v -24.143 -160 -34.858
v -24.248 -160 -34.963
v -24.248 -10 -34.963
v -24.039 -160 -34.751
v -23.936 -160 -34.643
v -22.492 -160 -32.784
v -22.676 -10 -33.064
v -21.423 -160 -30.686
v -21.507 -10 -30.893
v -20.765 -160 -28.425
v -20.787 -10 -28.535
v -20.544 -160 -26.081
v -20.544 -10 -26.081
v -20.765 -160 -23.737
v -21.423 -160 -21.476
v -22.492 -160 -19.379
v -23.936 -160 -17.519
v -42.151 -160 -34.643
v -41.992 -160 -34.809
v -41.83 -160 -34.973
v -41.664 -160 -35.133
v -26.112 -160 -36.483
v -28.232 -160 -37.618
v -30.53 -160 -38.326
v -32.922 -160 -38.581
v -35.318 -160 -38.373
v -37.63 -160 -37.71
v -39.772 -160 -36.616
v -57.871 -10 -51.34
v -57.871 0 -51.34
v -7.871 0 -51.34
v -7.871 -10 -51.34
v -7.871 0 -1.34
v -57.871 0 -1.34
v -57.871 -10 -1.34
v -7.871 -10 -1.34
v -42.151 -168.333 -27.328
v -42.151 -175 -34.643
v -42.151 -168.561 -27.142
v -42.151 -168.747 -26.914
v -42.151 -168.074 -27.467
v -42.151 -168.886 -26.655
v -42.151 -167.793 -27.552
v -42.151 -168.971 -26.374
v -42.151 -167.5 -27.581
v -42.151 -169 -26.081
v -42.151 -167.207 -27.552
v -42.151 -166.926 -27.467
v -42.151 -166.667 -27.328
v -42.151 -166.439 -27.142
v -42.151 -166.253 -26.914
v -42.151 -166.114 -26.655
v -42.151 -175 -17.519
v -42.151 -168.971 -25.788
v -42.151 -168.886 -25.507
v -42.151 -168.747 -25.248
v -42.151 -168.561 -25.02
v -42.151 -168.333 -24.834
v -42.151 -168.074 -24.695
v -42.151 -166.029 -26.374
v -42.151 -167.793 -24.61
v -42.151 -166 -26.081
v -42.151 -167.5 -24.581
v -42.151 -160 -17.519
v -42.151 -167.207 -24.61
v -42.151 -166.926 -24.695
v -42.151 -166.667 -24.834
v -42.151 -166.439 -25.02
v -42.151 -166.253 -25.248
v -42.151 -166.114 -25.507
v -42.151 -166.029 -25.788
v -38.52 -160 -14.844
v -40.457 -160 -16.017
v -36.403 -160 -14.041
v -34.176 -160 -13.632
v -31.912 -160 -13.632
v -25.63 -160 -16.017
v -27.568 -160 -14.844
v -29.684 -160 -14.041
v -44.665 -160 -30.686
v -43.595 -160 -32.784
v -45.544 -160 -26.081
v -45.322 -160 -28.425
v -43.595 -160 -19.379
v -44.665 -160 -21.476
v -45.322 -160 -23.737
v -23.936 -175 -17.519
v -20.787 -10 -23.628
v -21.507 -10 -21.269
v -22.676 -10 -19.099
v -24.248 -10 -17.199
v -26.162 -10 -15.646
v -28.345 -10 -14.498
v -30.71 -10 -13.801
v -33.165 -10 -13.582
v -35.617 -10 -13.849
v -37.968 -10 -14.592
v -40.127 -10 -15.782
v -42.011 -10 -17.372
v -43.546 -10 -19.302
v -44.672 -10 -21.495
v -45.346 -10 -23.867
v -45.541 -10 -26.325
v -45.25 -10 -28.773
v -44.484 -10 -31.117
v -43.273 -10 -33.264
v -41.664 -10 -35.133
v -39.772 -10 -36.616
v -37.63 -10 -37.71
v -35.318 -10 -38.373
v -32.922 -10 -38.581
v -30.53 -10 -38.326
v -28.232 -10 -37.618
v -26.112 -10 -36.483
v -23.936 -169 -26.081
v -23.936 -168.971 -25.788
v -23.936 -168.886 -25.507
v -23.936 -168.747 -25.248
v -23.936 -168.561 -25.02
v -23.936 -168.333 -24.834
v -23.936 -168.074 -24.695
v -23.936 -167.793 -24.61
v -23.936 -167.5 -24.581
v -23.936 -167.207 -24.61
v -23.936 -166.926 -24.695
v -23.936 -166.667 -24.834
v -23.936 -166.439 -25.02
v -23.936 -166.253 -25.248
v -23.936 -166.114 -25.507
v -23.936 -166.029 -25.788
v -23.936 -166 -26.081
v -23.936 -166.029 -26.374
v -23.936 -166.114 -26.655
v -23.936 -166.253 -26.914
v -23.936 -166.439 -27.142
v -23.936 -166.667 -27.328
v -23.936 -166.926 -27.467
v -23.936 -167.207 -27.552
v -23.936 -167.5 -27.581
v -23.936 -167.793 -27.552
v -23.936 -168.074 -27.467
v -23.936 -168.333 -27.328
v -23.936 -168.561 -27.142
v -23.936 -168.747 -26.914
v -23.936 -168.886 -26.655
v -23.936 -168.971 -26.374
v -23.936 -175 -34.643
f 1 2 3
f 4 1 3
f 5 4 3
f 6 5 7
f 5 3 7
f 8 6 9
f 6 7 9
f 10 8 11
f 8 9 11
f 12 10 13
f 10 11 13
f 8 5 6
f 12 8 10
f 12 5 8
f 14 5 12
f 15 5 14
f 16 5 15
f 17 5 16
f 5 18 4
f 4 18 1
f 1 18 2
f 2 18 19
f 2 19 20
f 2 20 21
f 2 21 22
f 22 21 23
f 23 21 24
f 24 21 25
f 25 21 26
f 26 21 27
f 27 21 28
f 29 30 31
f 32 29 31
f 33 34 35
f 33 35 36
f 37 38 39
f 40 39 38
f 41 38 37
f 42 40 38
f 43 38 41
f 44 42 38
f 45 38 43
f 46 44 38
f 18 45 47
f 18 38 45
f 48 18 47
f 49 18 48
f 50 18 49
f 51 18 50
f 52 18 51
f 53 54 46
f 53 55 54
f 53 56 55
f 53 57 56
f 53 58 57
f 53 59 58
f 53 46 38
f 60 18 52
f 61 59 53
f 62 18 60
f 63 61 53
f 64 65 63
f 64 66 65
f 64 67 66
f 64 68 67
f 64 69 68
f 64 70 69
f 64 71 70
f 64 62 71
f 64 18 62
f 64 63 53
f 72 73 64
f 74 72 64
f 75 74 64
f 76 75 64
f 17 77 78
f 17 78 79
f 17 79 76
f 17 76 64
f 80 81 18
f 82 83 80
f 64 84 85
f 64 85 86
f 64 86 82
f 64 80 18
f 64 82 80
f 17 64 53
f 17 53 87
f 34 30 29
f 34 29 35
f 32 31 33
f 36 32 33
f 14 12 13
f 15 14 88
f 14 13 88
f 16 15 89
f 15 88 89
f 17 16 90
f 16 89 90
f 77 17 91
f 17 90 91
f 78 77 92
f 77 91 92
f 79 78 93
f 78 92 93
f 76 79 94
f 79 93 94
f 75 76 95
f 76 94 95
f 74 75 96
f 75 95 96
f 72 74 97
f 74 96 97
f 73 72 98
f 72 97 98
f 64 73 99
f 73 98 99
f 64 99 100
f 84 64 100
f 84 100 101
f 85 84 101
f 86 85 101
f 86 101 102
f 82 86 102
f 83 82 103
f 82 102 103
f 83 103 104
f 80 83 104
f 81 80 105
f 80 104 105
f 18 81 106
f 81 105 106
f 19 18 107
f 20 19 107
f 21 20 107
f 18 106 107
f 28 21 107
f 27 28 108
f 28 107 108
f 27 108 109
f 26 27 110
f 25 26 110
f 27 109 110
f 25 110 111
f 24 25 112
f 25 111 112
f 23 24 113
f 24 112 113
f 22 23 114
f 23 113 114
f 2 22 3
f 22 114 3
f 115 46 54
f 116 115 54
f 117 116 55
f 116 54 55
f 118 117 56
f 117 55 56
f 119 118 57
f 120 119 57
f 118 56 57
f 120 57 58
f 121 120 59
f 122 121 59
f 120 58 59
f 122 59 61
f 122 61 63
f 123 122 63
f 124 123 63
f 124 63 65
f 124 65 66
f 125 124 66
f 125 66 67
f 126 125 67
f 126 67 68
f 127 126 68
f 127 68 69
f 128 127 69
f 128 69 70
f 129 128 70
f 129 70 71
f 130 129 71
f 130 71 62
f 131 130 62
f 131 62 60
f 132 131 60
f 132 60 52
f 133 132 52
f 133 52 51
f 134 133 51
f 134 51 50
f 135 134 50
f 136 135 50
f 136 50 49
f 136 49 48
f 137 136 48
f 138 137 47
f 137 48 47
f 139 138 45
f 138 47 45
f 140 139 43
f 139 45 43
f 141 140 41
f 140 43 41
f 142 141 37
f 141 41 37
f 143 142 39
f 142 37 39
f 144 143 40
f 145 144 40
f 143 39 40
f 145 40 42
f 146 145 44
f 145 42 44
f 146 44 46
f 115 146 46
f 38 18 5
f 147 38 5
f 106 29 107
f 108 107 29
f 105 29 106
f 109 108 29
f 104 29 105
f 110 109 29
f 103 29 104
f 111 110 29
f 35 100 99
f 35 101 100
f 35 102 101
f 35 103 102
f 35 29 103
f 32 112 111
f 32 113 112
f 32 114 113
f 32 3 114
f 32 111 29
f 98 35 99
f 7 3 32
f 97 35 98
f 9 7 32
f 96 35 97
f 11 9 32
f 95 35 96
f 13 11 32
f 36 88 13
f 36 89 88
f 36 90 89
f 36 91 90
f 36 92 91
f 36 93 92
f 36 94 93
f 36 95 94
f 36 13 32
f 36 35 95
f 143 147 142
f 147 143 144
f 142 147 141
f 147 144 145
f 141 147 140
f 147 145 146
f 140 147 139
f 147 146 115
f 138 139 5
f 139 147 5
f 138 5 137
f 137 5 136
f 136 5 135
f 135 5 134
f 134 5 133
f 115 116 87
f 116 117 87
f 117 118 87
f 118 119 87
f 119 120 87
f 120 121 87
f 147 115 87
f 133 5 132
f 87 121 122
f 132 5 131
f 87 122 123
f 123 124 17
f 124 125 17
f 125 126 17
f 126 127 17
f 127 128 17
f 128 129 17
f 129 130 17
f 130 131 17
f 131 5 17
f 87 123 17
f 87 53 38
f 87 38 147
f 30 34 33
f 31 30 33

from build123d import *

# Parameters (mm, degrees)
F0_W     = 50
F0_H     = 50
F1_DEPTH = 10
F4_DEPTH = 150
F5_W     = 18.2143148659
F5_H     = 17.1242148423
F6_DEPTH = 15
F8_D     = 3
F8_DEPTH = 50
F8_TIP   = 0.9012909285


with BuildPart() as f1:
    # F0 (on Front) → F1 (new body)
    with BuildSketch(Plane.XZ):
        with Locations((-32.8713305295, -26.3395220041)):
            Rectangle(F0_W, F0_H)
    extrude(amount=F1_DEPTH)

    # F3 (on face) → F4 (join)
    with BuildSketch(Plane.XZ.offset(10)):
        with BuildLine():
            ThreePointArc((-27.7835671151, -31.4272854184), (-26.1262573971, -28.9793373511), (-25.5436490476, -26.0811150074))
            ThreePointArc((-25.5436490476, -26.0811150074), (-36.0539043669, -19.2117363664), (-38.1272124911, -31.5954039658))
            Line((-38.1272124911, -31.5954039658), (-32.8713305295, -26.3395220041))
            Line((-32.8713305295, -26.3395220041), (-27.7835671151, -31.4272854184))
        make_face()
        with BuildLine():
            ThreePointArc((-38.1272124911, -31.5954039658), (-36.0539043669, -19.2117363664), (-25.5436490476, -26.0811150074))
            ThreePointArc((-25.5436490476, -26.0811150074), (-26.1262573971, -28.9793373511), (-27.7835671151, -31.4272854184))
            Line((-27.7835671151, -31.4272854184), (-24.2479633333, -34.9628892003))
            ThreePointArc((-24.2479633333, -34.9628892003), (-21.5068368486, -30.8927638189), (-20.5436490476, -26.0811150074))
            ThreePointArc((-20.5436490476, -26.0811150074), (-37.9675398455, -14.5917590894), (-41.6644969533, -35.1326884279))
            Line((-41.6644969533, -35.1326884279), (-38.1272124911, -31.5954039658))
        make_face()
        with BuildLine():
            Line((-32.8713305295, -26.3395220041), (-38.1272124911, -31.5954039658))
            ThreePointArc((-38.1272124911, -31.5954039658), (-32.921765268, -33.580124565), (-27.7835671151, -31.4272854184))
            Line((-27.7835671151, -31.4272854184), (-32.8713305295, -26.3395220041))
        make_face()
        with BuildLine():
            ThreePointArc((-27.7835671151, -31.4272854184), (-32.921765268, -33.580124565), (-38.1272124911, -31.5954039658))
            Line((-38.1272124911, -31.5954039658), (-41.6644969533, -35.1326884279))
            ThreePointArc((-41.6644969533, -35.1326884279), (-32.9217884335, -38.5805209929), (-24.2479633333, -34.9628892003))
            Line((-24.2479633333, -34.9628892003), (-27.7835671151, -31.4272854184))
        make_face()
    extrude(amount=F4_DEPTH)

    # F5 (on face) → F6 (join)
    with BuildSketch(Plane.XZ.offset(160)):
        with Locations((-33.0436490476, -26.0811150074)):
            Rectangle(F5_W, F5_H)
    extrude(amount=F6_DEPTH)

    # F8
    with Locations(Plane.YZ.offset(-23.9364916147)):
        with Locations((-167.5, -26.0811150074)):
            Hole(F8_D / 2, depth=F8_DEPTH)
            with Locations((0, 0, -(F8_DEPTH + F8_TIP / 2))):  # 118° drill point
                Cone(0, F8_D / 2, F8_TIP, mode=Mode.SUBTRACT)


solid = f1.part
